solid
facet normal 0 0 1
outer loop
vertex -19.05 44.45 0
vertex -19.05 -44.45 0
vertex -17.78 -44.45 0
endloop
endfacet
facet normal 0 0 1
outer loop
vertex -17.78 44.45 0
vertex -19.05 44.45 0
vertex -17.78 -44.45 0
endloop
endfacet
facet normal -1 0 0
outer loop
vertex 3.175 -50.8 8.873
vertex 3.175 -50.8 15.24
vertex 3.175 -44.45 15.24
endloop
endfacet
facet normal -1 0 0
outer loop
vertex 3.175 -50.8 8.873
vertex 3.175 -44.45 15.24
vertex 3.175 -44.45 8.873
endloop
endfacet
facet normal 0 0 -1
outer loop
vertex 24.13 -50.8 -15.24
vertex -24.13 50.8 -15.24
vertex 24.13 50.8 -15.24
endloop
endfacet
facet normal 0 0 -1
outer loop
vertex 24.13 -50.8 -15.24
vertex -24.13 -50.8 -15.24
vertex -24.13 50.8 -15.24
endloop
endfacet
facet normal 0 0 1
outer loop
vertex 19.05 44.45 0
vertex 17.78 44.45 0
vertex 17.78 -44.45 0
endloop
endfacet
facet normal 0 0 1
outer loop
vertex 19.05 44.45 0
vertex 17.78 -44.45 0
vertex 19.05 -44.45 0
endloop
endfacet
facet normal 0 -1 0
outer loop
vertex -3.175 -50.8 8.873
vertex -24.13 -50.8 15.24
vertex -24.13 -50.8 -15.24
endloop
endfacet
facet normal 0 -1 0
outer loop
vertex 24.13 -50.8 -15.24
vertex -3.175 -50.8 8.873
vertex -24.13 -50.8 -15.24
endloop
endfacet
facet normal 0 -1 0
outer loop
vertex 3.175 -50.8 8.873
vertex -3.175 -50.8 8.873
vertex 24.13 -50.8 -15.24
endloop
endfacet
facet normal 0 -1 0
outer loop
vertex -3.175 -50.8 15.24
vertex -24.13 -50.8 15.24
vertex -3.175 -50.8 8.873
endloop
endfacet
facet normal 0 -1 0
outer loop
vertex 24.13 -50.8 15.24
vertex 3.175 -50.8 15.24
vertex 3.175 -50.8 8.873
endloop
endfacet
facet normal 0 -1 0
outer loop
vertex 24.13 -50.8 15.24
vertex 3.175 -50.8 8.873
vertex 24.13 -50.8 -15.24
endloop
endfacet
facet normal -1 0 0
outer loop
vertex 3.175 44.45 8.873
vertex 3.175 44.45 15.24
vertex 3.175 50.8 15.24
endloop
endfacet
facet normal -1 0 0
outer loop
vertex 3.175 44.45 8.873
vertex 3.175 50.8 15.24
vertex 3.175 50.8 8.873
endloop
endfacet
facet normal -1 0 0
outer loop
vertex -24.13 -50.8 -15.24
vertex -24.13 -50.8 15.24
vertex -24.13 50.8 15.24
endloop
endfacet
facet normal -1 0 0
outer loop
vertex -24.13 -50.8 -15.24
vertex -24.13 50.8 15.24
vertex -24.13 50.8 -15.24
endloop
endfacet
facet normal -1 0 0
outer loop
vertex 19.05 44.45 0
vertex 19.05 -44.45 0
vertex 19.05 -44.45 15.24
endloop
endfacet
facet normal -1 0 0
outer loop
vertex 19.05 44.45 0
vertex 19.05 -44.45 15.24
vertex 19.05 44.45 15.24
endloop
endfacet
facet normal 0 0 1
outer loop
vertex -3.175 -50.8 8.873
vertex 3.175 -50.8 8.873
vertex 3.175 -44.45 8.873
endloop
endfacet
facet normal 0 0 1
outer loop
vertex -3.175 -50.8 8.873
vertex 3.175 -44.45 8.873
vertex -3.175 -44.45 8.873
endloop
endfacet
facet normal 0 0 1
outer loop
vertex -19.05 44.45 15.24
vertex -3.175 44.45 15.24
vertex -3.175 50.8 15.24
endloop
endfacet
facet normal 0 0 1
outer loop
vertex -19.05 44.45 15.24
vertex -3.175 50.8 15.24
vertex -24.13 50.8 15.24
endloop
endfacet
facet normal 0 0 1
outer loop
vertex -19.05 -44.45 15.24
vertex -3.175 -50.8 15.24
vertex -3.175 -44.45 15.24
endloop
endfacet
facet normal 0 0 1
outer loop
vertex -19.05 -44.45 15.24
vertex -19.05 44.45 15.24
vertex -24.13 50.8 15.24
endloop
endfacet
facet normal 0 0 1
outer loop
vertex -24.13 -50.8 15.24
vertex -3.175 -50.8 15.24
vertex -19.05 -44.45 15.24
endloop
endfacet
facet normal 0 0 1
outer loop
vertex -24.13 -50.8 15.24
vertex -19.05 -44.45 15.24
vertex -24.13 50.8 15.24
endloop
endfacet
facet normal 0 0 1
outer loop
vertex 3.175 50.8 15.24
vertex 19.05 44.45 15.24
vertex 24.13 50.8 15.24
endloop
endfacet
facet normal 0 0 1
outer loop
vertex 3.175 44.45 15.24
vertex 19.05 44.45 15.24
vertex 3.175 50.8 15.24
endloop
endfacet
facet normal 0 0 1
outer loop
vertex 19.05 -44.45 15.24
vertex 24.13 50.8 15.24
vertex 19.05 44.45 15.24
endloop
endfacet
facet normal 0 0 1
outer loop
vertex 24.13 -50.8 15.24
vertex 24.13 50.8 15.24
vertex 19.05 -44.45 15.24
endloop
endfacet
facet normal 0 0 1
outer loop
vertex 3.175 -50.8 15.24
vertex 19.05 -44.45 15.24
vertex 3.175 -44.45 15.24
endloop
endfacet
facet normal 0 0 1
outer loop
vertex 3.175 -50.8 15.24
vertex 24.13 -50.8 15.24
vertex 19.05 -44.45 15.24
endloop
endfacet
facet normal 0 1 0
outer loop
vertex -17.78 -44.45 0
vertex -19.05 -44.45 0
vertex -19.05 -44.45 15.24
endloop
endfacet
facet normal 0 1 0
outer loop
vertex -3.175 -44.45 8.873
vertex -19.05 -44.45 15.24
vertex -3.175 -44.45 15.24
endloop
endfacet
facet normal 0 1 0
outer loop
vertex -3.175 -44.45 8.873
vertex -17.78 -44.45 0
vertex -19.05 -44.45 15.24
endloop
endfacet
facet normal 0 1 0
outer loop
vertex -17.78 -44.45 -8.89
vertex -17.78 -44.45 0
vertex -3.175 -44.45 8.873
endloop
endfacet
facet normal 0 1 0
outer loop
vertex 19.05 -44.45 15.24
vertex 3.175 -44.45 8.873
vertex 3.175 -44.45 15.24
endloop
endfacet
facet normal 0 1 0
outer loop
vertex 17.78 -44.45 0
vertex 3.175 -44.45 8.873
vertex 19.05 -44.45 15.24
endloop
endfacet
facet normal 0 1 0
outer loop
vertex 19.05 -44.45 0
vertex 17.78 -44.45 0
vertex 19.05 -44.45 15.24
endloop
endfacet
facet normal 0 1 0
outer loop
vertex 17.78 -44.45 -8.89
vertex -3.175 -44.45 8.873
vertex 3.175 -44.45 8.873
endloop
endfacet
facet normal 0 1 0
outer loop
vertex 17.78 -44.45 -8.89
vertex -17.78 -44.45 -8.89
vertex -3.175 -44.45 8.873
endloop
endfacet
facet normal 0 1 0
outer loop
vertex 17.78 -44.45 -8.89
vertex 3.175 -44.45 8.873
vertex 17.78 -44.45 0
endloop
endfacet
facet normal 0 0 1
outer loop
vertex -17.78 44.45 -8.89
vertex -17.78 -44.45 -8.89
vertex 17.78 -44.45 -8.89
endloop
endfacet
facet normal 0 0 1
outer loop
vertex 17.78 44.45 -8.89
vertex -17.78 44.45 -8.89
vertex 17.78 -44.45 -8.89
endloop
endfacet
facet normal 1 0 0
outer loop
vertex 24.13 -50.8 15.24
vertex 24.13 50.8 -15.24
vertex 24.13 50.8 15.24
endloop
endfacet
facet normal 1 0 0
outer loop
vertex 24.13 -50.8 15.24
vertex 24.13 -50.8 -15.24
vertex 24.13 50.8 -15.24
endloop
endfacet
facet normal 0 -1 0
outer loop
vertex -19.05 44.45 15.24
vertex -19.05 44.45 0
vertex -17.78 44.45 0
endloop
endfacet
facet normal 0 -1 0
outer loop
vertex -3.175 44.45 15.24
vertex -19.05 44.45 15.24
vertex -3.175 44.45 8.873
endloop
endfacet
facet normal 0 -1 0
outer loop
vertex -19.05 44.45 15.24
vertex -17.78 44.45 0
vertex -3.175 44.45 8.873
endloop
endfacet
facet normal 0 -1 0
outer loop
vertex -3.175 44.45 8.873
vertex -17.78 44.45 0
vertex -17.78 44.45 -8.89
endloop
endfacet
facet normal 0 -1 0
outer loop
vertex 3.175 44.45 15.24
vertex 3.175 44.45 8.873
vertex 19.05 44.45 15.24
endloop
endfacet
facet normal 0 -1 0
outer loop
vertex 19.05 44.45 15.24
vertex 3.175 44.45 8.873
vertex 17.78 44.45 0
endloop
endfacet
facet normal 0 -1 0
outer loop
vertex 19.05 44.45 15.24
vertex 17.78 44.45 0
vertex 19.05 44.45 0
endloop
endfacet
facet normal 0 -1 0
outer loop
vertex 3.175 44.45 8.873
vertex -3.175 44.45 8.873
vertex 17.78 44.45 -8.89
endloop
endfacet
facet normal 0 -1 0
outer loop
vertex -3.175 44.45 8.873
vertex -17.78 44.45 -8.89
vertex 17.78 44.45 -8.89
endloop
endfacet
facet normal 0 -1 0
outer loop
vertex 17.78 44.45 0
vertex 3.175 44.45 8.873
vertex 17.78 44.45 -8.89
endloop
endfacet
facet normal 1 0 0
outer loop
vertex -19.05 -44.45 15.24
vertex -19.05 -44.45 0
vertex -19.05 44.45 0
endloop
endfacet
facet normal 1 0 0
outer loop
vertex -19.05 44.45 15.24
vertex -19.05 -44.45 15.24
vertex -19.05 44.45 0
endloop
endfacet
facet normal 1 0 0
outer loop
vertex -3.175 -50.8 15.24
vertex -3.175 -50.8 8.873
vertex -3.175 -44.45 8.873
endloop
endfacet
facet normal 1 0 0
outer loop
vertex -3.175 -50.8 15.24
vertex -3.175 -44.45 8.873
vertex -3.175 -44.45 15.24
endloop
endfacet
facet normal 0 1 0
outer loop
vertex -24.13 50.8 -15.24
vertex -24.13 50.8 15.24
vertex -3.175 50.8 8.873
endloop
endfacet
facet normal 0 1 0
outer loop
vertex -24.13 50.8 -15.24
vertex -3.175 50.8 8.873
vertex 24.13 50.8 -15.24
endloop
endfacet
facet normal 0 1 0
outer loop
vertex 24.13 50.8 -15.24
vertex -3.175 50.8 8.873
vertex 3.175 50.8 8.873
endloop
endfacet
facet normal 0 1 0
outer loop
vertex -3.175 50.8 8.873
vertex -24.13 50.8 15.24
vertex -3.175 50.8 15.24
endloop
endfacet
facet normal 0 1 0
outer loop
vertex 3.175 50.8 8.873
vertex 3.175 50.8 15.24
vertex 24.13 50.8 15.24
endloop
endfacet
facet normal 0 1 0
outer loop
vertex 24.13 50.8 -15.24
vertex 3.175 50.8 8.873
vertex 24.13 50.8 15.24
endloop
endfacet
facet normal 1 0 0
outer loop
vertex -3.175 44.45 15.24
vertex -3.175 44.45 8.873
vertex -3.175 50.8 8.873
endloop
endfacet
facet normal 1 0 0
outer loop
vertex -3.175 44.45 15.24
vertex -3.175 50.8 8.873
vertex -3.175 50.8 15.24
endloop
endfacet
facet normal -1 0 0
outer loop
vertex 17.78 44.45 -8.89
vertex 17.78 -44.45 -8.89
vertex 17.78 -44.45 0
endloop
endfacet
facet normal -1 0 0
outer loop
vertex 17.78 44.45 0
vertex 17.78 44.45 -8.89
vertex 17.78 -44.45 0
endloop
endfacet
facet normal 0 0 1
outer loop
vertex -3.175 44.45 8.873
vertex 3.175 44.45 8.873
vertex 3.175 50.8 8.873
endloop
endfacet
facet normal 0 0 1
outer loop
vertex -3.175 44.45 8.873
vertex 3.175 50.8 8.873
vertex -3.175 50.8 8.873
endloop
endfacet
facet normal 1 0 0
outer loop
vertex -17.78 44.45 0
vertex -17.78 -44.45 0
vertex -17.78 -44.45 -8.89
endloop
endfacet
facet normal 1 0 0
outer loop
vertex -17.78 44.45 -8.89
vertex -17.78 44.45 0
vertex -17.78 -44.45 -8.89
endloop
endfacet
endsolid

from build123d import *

# Parameters (mm, degrees)
F1_DEPTH = 50.8
F2_DEPTH = 50.8
F5_T     = -6.35
F4_W     = 38.1
F4_H     = 88.9
F6_DEPTH = 31.75


with BuildPart() as f1:
    # F0 (on Front) → F1 (new body)
    with BuildSketch(Plane.XZ):
        Polygon((24.13, -15.24), (24.13, 15.24), (19.05, 15.24), (19.05, -10.16), (-19.05, -10.16), (-19.05, 15.24), (-24.13, 15.24), (-24.13, -15.24), align=None)
    extrude(amount=F1_DEPTH)

    # F0 (on Front) → F2 (join)
    with BuildSketch(Plane.XZ):
        Polygon((19.05, -10.16), (19.05, 15.24), (3.175, 15.24), (3.175, 8.8727482983), (-3.175, 8.8727482983), (-3.175, 15.24), (-19.05, 15.24), (-19.05, -10.16), align=None)
    extrude(amount=F2_DEPTH)

    # F3: F1 across plane


with BuildPart() as f1_1:
    add(f1.part)
    add(f1.part.mirror(Plane.XZ))

    # F5
    f5_openings = [f1_1.faces().sort_by_distance(p)[0] for p in [
        (13.6525, 0, 15.24),
        (-13.6525, 0, 15.24),
    ]]
    offset(amount=F5_T, openings=f5_openings, kind=Kind.INTERSECTION)

    # F4 (on Top) → F6 (cut)
    with BuildSketch(Plane.XY):
        Rectangle(F4_W, F4_H)
    extrude(amount=F6_DEPTH, mode=Mode.SUBTRACT)


solid = f1_1.part
